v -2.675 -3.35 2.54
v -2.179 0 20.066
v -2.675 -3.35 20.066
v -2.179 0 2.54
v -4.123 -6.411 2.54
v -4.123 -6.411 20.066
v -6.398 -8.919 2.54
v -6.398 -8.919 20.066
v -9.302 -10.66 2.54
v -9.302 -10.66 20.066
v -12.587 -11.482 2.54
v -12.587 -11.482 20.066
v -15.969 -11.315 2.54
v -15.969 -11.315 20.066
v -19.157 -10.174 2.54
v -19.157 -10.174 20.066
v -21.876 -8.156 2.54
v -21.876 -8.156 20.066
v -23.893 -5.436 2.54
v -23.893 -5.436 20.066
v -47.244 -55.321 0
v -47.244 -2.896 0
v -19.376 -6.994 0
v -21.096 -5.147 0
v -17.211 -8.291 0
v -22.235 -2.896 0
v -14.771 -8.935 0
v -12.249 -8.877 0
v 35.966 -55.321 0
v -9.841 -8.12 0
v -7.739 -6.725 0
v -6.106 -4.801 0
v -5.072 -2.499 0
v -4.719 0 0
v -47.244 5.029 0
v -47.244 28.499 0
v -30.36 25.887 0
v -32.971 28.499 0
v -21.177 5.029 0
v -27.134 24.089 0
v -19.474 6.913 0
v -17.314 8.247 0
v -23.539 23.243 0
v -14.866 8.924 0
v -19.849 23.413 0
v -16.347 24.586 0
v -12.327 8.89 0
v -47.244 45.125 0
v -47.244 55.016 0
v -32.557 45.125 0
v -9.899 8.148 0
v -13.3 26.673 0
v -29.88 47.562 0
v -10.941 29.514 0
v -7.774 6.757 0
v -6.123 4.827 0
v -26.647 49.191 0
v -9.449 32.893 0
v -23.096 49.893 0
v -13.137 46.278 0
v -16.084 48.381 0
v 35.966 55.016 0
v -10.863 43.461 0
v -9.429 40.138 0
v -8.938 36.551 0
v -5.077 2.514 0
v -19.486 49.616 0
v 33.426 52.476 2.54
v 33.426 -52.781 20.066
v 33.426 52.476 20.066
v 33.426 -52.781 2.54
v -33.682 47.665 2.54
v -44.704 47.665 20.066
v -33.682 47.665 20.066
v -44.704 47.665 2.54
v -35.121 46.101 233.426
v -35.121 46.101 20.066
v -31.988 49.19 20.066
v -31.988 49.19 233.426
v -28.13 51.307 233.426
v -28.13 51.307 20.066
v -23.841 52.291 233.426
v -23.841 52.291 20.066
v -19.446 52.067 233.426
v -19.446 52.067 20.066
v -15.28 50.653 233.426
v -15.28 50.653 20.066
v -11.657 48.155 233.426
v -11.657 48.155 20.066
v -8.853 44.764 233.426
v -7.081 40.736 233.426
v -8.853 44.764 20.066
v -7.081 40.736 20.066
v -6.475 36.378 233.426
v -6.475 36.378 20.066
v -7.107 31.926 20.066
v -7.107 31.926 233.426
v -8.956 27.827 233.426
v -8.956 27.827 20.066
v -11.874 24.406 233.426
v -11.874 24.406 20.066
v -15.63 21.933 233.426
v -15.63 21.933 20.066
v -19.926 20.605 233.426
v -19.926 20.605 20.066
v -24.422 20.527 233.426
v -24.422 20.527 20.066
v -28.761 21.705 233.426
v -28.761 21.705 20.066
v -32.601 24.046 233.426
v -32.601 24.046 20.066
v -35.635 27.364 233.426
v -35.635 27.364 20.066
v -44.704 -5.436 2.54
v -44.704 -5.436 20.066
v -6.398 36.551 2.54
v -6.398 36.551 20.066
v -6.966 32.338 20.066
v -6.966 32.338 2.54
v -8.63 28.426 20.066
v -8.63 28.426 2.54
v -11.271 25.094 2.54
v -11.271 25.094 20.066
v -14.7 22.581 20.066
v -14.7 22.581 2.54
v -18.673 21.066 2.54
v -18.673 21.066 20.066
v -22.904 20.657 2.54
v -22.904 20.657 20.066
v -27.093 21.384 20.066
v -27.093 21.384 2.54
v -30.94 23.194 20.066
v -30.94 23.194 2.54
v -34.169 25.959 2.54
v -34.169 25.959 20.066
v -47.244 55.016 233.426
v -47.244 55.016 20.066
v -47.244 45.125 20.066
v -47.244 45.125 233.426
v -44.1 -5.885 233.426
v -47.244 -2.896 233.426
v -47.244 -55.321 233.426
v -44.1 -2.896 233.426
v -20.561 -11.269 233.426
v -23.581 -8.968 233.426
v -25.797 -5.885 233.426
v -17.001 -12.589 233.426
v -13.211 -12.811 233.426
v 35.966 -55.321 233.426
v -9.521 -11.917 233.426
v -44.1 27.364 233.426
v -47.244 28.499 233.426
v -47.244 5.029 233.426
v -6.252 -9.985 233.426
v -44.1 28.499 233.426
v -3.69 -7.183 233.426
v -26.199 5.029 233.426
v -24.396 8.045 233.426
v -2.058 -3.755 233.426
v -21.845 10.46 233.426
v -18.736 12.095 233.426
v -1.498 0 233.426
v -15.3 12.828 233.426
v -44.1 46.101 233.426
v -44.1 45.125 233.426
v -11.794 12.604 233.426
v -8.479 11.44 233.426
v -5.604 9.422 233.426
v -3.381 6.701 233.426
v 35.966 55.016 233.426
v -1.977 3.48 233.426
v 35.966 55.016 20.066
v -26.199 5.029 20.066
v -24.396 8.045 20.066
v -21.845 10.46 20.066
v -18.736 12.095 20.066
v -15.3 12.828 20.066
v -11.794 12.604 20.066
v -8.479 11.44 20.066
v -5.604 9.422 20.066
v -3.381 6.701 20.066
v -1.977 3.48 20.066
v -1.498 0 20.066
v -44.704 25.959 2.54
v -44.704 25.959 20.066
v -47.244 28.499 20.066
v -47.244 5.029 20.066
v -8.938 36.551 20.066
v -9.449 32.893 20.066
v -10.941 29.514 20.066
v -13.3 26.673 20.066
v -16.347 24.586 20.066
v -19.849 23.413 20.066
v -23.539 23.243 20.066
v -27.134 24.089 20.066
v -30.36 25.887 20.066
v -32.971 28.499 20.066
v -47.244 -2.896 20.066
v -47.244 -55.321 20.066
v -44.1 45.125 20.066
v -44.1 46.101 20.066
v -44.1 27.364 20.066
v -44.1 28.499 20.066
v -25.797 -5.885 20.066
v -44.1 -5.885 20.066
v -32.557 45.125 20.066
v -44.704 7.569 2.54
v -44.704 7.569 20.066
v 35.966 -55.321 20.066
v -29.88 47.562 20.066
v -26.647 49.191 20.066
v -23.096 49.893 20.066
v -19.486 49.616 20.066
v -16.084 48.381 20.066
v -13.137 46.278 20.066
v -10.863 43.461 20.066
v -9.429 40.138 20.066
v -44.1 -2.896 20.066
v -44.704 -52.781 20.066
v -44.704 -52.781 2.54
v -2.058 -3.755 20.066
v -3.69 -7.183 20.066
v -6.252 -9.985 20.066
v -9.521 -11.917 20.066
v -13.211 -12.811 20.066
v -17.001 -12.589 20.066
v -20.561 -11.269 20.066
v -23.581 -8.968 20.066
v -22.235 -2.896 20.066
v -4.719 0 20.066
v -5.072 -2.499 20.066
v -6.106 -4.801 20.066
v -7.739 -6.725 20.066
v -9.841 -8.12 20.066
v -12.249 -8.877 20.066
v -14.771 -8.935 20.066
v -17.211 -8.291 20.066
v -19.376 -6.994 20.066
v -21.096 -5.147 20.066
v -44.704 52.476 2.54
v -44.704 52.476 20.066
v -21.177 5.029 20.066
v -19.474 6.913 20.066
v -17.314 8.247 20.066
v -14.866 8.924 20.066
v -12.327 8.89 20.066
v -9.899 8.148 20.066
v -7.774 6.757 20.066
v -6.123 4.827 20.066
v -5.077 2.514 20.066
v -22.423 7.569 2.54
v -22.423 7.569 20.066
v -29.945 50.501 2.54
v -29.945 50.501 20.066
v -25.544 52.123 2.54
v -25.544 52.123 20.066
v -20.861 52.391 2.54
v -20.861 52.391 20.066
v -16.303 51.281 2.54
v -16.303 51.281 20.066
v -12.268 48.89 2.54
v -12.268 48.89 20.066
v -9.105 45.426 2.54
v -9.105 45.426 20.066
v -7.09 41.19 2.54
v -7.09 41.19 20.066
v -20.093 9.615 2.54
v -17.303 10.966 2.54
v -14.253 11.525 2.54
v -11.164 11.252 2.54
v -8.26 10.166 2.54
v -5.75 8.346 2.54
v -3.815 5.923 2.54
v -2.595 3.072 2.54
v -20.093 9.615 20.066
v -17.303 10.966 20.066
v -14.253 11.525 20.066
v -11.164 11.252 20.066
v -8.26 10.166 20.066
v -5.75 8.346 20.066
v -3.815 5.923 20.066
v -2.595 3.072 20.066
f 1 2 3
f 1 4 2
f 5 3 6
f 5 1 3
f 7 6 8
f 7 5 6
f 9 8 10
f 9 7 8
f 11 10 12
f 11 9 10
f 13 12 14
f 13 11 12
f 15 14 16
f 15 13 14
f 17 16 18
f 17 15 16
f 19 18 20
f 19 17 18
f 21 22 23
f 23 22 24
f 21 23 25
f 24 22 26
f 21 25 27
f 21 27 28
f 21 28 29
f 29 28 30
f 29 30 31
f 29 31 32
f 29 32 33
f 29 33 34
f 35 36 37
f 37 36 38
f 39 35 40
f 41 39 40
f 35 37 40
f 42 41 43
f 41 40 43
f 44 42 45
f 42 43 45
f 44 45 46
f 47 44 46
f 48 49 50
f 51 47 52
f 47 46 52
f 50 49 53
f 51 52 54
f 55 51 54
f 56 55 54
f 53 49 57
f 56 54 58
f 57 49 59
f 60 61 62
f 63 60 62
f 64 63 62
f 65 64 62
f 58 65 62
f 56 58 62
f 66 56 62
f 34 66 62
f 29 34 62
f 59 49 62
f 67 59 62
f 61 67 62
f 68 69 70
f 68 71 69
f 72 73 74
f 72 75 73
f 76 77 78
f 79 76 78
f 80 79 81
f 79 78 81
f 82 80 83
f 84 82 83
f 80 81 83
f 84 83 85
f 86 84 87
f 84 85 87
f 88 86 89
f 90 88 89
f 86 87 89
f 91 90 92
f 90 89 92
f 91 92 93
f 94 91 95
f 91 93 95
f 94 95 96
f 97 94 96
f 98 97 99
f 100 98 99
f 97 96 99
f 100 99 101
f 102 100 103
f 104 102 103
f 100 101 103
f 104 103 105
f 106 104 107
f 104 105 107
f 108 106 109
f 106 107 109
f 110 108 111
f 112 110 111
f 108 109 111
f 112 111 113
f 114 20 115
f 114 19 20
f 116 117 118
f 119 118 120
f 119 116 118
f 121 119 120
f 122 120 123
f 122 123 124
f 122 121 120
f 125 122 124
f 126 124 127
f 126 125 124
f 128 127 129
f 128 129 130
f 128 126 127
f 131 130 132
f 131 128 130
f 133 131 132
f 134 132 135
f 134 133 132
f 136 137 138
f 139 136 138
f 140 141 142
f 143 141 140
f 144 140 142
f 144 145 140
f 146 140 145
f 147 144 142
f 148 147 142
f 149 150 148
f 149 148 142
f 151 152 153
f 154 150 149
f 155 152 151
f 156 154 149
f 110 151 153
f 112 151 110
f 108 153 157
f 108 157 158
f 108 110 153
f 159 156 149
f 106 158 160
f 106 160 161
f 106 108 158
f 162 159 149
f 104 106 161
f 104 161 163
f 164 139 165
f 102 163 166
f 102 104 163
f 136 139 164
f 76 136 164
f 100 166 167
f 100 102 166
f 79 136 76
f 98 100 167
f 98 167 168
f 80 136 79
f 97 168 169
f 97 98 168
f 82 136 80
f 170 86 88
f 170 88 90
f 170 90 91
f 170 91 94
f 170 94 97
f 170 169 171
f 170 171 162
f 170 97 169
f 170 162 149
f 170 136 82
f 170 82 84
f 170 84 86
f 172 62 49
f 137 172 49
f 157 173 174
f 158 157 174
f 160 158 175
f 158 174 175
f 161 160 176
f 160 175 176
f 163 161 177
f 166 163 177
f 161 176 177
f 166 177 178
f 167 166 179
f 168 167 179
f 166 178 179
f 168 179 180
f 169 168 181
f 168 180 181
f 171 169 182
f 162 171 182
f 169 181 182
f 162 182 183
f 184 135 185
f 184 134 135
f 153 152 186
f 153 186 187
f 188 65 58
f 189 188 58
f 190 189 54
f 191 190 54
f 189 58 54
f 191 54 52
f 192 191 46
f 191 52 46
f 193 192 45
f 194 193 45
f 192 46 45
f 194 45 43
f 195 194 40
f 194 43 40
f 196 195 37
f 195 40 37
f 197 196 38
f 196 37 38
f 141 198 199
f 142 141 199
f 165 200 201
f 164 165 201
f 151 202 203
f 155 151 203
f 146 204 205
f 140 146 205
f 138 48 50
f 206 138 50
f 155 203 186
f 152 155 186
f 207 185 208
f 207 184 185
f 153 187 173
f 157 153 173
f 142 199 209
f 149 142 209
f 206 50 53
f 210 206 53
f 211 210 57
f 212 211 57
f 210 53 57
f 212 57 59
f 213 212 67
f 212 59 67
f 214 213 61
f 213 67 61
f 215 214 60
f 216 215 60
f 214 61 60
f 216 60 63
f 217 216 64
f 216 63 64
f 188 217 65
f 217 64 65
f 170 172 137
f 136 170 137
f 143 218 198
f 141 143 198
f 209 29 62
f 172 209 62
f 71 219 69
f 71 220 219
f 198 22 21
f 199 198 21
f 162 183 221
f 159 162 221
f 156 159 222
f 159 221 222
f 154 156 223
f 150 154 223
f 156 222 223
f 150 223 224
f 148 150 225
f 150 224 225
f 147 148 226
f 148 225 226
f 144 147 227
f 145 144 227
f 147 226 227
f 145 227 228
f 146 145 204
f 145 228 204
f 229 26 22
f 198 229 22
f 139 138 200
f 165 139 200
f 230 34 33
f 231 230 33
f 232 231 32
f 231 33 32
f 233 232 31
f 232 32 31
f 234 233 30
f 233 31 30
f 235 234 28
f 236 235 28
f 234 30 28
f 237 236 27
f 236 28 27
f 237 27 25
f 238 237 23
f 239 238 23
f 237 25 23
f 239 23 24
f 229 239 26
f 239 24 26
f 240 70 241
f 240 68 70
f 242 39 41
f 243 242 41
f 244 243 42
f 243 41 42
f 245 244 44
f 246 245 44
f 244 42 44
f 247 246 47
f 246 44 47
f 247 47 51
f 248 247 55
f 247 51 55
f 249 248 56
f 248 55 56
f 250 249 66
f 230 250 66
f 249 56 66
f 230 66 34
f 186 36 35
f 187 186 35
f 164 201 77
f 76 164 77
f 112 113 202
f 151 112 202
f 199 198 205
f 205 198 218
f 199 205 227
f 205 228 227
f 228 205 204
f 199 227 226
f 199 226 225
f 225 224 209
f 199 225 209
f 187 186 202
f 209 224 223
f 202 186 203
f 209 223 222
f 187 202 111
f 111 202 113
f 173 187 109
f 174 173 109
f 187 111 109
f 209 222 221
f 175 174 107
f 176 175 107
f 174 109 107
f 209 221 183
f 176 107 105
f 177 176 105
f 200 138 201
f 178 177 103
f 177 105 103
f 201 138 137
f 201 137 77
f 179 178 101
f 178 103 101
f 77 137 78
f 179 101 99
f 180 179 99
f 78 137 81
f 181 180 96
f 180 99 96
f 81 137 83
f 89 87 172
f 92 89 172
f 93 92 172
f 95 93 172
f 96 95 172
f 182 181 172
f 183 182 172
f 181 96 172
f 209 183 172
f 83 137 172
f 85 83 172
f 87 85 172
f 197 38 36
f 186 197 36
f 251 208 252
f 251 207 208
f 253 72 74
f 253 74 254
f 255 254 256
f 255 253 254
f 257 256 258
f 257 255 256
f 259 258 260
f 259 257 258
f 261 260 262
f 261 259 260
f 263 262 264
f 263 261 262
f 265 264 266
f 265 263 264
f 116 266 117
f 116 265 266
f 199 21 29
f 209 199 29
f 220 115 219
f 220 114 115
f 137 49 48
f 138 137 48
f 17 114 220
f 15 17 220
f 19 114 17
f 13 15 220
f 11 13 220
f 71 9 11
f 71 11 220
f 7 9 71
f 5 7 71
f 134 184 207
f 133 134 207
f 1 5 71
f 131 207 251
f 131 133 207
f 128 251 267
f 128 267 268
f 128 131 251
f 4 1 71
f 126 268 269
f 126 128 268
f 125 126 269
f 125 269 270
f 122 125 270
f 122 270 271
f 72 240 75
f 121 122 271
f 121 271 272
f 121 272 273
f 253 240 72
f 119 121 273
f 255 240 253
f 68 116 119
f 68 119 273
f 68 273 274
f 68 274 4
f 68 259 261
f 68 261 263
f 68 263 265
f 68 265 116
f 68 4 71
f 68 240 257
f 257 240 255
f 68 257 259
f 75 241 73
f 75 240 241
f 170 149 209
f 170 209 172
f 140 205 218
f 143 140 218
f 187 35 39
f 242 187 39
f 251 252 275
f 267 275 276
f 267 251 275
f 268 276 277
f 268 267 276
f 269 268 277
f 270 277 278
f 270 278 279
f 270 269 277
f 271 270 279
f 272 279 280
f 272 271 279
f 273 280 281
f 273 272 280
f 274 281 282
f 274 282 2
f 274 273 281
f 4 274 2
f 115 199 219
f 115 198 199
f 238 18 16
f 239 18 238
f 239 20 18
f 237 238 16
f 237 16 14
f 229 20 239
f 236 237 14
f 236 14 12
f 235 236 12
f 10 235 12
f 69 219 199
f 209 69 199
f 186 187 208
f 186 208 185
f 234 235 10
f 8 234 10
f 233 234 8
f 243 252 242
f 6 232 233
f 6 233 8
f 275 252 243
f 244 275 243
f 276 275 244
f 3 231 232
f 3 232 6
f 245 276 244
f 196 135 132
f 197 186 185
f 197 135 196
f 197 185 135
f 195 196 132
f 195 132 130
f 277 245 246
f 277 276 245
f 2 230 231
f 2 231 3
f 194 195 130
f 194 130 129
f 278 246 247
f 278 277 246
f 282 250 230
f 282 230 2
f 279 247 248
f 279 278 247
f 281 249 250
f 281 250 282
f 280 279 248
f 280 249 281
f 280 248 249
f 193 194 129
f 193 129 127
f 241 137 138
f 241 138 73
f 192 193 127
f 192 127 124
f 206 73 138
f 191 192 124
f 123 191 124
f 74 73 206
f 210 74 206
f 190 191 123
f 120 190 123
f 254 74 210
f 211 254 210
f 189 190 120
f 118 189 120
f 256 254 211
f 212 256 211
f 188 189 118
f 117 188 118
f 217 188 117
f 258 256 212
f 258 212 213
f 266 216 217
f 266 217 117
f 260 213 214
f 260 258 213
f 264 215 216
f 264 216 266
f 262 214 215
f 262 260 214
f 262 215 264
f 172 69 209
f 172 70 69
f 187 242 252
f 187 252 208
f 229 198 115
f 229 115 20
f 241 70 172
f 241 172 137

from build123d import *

# Parameters (mm, degrees)
F1_DEPTH = 20.066
F3_T     = -2.54
F5_DEPTH = 213.36


with BuildPart() as f1:
    # F0 (on Top) → F1 (new body)
    with BuildSketch(Plane.XY):
        with BuildLine():
            Line((35.966404, 55.016398), (-47.244001, 55.016398))
            Line((-47.244001, 55.016398), (-47.244001, 45.125062))
            Line((-47.244001, 45.125062), (-32.556663, 45.125062))
            ThreePointArc((-32.556663, 45.125062), (-17.743007, 49.114259), (-8.938304, 36.551006))
            ThreePointArc((-8.938304, 36.551006), (-18.057711, 23.877929), (-32.971396, 28.4988))
            Line((-32.971396, 28.4988), (-47.244001, 28.4988))
            Line((-47.244001, 28.4988), (-47.244001, 5.0292))
            Line((-47.244001, 5.0292), (-21.176632, 5.0292))
            ThreePointArc((-21.176632, 5.0292), (-11.086616, 8.604664), (-4.718561, 0))
            ThreePointArc((-4.718561, 0), (-12.24855, -8.876964), (-22.234767, -2.8956))
            Line((-22.234767, -2.8956), (-47.244001, -2.8956))
            Line((-47.244001, -2.8956), (-47.244001, -55.321198))
            Line((-47.244001, -55.321198), (35.966404, -55.321198))
            Line((35.966404, -55.321198), (35.966404, 55.016398))
        make_face()
    extrude(amount=F1_DEPTH)

    # F3
    f3_openings = [f1.faces().sort_by_distance(p)[0] for p in [
        (-2.561101, -3.741649, 20.066),
    ]]
    offset(amount=F3_T, openings=f3_openings)


with BuildPart() as f5:
    # F4 (on face) → F5 (new body)
    with BuildSketch(Plane.XY.offset(20.066)):
        with BuildLine():
            ThreePointArc((-35.121377, 46.101339), (-17.314044, 51.504017), (-6.474563, 36.378022))
            ThreePointArc((-6.474563, 36.378022), (-17.730761, 21.116929), (-35.635384, 27.364122))
            Line((-35.635384, 27.364122), (-44.100296, 27.364122))
            Line((-44.100296, 27.364122), (-44.100296, 28.4988))
            Line((-44.100296, 28.4988), (-47.244001, 28.4988))
            Line((-47.244001, 28.4988), (-47.244001, 5.0292))
            Line((-47.244001, 5.0292), (-26.198802, 5.0292))
            ThreePointArc((-26.198802, 5.0292), (-11.79399, 12.603987), (-1.497605, 0))
            ThreePointArc((-1.497605, 0), (-11.332444, -12.501146), (-25.79735, -5.885318))
            Line((-25.79735, -5.885318), (-44.100296, -5.885318))
            Line((-44.100296, -5.885318), (-44.100296, -2.8956))
            Line((-44.100296, -2.8956), (-47.244001, -2.8956))
            Line((-47.244001, -2.8956), (-47.244001, -55.321198))
            Line((-47.244001, -55.321198), (35.966404, -55.321198))
            Line((35.966404, -55.321198), (35.966404, 55.016398))
            Line((35.966404, 55.016398), (-47.244001, 55.016398))
            Line((-47.244001, 55.016398), (-47.244001, 45.125062))
            Line((-47.244001, 45.125062), (-44.100296, 45.125062))
            Line((-44.100296, 45.125062), (-44.100296, 46.101339))
            Line((-44.100296, 46.101339), (-35.121377, 46.101339))
        make_face()
    extrude(amount=F5_DEPTH)


solid = Compound([f1.part, f5.part])
